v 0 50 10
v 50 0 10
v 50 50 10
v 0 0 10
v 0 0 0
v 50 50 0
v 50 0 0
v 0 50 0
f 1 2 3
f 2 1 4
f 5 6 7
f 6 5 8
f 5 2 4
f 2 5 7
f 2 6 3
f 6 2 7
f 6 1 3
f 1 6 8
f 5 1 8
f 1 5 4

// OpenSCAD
// Parameters
cube_size = 50;
cube_height = 10;
surface_scale = 1;
surface_height = 20;

// Base cube
cube([cube_size, cube_size, cube_height]);

// Surface heightmap on top of the cube
translate([0, 0, cube_height])
    surface(
        file = "image2.png",   // Convert image1.jpg → image1.png first
        center = false,
        invert = false,
        convexity = 5
    );
